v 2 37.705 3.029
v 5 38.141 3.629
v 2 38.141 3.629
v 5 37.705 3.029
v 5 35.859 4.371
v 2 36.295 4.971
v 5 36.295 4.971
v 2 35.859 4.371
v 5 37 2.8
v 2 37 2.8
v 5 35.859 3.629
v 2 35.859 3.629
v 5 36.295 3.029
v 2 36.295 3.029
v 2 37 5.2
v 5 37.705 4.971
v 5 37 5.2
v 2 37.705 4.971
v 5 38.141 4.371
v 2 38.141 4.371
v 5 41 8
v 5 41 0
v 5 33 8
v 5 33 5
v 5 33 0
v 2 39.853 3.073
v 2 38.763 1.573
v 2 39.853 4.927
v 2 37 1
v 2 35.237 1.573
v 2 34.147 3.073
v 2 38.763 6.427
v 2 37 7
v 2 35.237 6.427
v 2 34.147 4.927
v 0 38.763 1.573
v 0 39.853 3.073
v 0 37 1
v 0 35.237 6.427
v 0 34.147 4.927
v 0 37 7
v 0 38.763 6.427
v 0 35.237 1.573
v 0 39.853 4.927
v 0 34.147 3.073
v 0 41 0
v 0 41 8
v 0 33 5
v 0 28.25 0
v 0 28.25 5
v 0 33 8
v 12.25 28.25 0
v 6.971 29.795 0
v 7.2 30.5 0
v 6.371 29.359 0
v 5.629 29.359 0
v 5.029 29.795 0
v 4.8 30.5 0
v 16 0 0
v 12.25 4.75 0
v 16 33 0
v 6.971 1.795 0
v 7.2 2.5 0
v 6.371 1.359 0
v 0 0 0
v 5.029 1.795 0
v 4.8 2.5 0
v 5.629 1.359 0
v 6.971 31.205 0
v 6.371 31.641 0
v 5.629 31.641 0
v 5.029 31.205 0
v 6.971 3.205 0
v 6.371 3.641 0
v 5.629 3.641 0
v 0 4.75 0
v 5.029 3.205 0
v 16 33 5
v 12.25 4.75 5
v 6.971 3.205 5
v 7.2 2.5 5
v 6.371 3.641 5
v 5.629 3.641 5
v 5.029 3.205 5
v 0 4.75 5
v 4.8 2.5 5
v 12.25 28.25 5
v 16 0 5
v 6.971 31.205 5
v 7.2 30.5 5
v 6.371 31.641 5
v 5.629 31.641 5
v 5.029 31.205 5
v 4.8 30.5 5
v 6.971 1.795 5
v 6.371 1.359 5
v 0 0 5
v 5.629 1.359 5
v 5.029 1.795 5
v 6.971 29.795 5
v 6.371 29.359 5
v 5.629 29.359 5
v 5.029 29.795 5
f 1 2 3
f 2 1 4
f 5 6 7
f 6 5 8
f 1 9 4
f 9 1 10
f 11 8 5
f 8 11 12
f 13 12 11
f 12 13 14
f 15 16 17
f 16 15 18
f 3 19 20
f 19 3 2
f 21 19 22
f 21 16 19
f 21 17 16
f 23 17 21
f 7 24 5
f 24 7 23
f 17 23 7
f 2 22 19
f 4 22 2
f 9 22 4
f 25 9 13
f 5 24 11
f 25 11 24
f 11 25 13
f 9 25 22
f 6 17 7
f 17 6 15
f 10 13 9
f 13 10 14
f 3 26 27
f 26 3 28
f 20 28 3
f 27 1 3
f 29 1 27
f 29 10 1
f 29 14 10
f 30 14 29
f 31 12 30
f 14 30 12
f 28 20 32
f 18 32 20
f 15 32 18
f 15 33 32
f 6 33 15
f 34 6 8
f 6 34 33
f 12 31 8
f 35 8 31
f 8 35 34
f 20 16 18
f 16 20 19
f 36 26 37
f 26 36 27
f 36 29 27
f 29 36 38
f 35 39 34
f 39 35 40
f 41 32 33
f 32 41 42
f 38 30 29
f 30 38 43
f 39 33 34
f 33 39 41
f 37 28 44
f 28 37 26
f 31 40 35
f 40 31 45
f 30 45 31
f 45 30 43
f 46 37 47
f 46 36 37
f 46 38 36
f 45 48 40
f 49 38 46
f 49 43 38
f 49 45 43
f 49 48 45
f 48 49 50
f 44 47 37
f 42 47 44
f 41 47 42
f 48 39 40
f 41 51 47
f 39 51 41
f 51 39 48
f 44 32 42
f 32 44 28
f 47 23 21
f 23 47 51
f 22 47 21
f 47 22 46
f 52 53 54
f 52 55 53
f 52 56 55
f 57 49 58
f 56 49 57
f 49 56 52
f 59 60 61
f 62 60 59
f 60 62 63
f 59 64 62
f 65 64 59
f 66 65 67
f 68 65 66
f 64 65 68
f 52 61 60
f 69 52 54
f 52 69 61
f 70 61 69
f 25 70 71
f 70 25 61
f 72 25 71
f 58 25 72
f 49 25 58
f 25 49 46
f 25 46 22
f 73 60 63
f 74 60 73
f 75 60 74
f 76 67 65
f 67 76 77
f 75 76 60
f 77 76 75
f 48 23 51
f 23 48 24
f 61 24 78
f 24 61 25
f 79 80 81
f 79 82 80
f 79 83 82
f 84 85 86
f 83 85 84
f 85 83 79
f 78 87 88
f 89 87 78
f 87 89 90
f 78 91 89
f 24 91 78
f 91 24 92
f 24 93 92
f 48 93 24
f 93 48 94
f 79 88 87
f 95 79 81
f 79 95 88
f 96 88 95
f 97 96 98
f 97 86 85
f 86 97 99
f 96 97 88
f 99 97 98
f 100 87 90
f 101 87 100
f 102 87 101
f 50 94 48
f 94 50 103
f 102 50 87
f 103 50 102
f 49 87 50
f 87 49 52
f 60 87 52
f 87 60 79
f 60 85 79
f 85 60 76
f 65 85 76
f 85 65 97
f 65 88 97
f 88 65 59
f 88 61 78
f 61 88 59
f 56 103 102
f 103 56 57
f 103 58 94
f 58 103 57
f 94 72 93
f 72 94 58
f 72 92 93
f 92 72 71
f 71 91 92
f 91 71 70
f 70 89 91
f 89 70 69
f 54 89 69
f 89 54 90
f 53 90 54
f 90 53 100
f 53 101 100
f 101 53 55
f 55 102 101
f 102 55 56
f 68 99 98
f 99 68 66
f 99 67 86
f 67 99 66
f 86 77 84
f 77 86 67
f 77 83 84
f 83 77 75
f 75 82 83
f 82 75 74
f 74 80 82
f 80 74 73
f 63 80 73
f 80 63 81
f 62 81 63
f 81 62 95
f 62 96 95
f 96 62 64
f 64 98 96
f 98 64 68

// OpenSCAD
use <../../Writescad/Write.scad>

//////////////////////////
// MOTOR - HOLDER

module screws()
{
    radius = 1.2;
    distance = 28;

    translate([0, 0])
        circle(r = radius, $fn = 10);
    translate([0, distance])
        circle(r = radius, $fn = 10);
}

module body()
{
    width = 12.5;
    length = 23.5;

    translate([-width / 2, 2.25])
        square([width, length]);
}

module motor()
{
    screws();
    body();
}

//////////////////////////
// LEG

module leg(width)
{
    thickness = 5;
    length = 33;
    
    points = [
        [0, 0],
        [0, length],
        [width, length],
        [width, 0]
    ];

    linear_extrude(height = thickness)
        difference()
        {
            polygon(points=points);
            translate([6, 2.5])
                motor();
        }
}

module text(width, fontsize)
{
    x = 1.2;
    y = 1.5;
    z = 4.5;

    translate([width - x, y, z])
        rotate([0, 0, 90])
            write("top", h = fontsize);
}

//////////////////////////
// SPIN SHAFT

module spin_shaft()
{
    small_radius = 1.2;
    large_radius = 3;
    small_depth = 3;
    large_depth = 2;
    x = 0;
    y = 37;
    z = 4;

    translate([x + large_depth, y, z])
        rotate([0, 90, 0])
            linear_extrude(height = small_depth)
                    circle(r = small_radius, $fn = 10);
    translate([x, y, z])
        rotate([0, 90, 0])
            linear_extrude(height = large_depth)
                circle(r = large_radius, $fn = 10);
}

module spin_shaft_socket()
{
    width = 8;
    depth = 5;
    x = 0;
    z = 8;
    y = 33;

    translate([x, y, z])
        rotate([0, 90, 0])
            linear_extrude(height = depth)
                square([width, width]);
}


//////////////////////////
// GLOBALS

width = 16;
fontsize = 3;

//////////////////////////
// RENDER

difference()
{
    spin_shaft_socket();
    spin_shaft();
}
difference()
{
    leg(width);
    text(width, fontsize);
}
